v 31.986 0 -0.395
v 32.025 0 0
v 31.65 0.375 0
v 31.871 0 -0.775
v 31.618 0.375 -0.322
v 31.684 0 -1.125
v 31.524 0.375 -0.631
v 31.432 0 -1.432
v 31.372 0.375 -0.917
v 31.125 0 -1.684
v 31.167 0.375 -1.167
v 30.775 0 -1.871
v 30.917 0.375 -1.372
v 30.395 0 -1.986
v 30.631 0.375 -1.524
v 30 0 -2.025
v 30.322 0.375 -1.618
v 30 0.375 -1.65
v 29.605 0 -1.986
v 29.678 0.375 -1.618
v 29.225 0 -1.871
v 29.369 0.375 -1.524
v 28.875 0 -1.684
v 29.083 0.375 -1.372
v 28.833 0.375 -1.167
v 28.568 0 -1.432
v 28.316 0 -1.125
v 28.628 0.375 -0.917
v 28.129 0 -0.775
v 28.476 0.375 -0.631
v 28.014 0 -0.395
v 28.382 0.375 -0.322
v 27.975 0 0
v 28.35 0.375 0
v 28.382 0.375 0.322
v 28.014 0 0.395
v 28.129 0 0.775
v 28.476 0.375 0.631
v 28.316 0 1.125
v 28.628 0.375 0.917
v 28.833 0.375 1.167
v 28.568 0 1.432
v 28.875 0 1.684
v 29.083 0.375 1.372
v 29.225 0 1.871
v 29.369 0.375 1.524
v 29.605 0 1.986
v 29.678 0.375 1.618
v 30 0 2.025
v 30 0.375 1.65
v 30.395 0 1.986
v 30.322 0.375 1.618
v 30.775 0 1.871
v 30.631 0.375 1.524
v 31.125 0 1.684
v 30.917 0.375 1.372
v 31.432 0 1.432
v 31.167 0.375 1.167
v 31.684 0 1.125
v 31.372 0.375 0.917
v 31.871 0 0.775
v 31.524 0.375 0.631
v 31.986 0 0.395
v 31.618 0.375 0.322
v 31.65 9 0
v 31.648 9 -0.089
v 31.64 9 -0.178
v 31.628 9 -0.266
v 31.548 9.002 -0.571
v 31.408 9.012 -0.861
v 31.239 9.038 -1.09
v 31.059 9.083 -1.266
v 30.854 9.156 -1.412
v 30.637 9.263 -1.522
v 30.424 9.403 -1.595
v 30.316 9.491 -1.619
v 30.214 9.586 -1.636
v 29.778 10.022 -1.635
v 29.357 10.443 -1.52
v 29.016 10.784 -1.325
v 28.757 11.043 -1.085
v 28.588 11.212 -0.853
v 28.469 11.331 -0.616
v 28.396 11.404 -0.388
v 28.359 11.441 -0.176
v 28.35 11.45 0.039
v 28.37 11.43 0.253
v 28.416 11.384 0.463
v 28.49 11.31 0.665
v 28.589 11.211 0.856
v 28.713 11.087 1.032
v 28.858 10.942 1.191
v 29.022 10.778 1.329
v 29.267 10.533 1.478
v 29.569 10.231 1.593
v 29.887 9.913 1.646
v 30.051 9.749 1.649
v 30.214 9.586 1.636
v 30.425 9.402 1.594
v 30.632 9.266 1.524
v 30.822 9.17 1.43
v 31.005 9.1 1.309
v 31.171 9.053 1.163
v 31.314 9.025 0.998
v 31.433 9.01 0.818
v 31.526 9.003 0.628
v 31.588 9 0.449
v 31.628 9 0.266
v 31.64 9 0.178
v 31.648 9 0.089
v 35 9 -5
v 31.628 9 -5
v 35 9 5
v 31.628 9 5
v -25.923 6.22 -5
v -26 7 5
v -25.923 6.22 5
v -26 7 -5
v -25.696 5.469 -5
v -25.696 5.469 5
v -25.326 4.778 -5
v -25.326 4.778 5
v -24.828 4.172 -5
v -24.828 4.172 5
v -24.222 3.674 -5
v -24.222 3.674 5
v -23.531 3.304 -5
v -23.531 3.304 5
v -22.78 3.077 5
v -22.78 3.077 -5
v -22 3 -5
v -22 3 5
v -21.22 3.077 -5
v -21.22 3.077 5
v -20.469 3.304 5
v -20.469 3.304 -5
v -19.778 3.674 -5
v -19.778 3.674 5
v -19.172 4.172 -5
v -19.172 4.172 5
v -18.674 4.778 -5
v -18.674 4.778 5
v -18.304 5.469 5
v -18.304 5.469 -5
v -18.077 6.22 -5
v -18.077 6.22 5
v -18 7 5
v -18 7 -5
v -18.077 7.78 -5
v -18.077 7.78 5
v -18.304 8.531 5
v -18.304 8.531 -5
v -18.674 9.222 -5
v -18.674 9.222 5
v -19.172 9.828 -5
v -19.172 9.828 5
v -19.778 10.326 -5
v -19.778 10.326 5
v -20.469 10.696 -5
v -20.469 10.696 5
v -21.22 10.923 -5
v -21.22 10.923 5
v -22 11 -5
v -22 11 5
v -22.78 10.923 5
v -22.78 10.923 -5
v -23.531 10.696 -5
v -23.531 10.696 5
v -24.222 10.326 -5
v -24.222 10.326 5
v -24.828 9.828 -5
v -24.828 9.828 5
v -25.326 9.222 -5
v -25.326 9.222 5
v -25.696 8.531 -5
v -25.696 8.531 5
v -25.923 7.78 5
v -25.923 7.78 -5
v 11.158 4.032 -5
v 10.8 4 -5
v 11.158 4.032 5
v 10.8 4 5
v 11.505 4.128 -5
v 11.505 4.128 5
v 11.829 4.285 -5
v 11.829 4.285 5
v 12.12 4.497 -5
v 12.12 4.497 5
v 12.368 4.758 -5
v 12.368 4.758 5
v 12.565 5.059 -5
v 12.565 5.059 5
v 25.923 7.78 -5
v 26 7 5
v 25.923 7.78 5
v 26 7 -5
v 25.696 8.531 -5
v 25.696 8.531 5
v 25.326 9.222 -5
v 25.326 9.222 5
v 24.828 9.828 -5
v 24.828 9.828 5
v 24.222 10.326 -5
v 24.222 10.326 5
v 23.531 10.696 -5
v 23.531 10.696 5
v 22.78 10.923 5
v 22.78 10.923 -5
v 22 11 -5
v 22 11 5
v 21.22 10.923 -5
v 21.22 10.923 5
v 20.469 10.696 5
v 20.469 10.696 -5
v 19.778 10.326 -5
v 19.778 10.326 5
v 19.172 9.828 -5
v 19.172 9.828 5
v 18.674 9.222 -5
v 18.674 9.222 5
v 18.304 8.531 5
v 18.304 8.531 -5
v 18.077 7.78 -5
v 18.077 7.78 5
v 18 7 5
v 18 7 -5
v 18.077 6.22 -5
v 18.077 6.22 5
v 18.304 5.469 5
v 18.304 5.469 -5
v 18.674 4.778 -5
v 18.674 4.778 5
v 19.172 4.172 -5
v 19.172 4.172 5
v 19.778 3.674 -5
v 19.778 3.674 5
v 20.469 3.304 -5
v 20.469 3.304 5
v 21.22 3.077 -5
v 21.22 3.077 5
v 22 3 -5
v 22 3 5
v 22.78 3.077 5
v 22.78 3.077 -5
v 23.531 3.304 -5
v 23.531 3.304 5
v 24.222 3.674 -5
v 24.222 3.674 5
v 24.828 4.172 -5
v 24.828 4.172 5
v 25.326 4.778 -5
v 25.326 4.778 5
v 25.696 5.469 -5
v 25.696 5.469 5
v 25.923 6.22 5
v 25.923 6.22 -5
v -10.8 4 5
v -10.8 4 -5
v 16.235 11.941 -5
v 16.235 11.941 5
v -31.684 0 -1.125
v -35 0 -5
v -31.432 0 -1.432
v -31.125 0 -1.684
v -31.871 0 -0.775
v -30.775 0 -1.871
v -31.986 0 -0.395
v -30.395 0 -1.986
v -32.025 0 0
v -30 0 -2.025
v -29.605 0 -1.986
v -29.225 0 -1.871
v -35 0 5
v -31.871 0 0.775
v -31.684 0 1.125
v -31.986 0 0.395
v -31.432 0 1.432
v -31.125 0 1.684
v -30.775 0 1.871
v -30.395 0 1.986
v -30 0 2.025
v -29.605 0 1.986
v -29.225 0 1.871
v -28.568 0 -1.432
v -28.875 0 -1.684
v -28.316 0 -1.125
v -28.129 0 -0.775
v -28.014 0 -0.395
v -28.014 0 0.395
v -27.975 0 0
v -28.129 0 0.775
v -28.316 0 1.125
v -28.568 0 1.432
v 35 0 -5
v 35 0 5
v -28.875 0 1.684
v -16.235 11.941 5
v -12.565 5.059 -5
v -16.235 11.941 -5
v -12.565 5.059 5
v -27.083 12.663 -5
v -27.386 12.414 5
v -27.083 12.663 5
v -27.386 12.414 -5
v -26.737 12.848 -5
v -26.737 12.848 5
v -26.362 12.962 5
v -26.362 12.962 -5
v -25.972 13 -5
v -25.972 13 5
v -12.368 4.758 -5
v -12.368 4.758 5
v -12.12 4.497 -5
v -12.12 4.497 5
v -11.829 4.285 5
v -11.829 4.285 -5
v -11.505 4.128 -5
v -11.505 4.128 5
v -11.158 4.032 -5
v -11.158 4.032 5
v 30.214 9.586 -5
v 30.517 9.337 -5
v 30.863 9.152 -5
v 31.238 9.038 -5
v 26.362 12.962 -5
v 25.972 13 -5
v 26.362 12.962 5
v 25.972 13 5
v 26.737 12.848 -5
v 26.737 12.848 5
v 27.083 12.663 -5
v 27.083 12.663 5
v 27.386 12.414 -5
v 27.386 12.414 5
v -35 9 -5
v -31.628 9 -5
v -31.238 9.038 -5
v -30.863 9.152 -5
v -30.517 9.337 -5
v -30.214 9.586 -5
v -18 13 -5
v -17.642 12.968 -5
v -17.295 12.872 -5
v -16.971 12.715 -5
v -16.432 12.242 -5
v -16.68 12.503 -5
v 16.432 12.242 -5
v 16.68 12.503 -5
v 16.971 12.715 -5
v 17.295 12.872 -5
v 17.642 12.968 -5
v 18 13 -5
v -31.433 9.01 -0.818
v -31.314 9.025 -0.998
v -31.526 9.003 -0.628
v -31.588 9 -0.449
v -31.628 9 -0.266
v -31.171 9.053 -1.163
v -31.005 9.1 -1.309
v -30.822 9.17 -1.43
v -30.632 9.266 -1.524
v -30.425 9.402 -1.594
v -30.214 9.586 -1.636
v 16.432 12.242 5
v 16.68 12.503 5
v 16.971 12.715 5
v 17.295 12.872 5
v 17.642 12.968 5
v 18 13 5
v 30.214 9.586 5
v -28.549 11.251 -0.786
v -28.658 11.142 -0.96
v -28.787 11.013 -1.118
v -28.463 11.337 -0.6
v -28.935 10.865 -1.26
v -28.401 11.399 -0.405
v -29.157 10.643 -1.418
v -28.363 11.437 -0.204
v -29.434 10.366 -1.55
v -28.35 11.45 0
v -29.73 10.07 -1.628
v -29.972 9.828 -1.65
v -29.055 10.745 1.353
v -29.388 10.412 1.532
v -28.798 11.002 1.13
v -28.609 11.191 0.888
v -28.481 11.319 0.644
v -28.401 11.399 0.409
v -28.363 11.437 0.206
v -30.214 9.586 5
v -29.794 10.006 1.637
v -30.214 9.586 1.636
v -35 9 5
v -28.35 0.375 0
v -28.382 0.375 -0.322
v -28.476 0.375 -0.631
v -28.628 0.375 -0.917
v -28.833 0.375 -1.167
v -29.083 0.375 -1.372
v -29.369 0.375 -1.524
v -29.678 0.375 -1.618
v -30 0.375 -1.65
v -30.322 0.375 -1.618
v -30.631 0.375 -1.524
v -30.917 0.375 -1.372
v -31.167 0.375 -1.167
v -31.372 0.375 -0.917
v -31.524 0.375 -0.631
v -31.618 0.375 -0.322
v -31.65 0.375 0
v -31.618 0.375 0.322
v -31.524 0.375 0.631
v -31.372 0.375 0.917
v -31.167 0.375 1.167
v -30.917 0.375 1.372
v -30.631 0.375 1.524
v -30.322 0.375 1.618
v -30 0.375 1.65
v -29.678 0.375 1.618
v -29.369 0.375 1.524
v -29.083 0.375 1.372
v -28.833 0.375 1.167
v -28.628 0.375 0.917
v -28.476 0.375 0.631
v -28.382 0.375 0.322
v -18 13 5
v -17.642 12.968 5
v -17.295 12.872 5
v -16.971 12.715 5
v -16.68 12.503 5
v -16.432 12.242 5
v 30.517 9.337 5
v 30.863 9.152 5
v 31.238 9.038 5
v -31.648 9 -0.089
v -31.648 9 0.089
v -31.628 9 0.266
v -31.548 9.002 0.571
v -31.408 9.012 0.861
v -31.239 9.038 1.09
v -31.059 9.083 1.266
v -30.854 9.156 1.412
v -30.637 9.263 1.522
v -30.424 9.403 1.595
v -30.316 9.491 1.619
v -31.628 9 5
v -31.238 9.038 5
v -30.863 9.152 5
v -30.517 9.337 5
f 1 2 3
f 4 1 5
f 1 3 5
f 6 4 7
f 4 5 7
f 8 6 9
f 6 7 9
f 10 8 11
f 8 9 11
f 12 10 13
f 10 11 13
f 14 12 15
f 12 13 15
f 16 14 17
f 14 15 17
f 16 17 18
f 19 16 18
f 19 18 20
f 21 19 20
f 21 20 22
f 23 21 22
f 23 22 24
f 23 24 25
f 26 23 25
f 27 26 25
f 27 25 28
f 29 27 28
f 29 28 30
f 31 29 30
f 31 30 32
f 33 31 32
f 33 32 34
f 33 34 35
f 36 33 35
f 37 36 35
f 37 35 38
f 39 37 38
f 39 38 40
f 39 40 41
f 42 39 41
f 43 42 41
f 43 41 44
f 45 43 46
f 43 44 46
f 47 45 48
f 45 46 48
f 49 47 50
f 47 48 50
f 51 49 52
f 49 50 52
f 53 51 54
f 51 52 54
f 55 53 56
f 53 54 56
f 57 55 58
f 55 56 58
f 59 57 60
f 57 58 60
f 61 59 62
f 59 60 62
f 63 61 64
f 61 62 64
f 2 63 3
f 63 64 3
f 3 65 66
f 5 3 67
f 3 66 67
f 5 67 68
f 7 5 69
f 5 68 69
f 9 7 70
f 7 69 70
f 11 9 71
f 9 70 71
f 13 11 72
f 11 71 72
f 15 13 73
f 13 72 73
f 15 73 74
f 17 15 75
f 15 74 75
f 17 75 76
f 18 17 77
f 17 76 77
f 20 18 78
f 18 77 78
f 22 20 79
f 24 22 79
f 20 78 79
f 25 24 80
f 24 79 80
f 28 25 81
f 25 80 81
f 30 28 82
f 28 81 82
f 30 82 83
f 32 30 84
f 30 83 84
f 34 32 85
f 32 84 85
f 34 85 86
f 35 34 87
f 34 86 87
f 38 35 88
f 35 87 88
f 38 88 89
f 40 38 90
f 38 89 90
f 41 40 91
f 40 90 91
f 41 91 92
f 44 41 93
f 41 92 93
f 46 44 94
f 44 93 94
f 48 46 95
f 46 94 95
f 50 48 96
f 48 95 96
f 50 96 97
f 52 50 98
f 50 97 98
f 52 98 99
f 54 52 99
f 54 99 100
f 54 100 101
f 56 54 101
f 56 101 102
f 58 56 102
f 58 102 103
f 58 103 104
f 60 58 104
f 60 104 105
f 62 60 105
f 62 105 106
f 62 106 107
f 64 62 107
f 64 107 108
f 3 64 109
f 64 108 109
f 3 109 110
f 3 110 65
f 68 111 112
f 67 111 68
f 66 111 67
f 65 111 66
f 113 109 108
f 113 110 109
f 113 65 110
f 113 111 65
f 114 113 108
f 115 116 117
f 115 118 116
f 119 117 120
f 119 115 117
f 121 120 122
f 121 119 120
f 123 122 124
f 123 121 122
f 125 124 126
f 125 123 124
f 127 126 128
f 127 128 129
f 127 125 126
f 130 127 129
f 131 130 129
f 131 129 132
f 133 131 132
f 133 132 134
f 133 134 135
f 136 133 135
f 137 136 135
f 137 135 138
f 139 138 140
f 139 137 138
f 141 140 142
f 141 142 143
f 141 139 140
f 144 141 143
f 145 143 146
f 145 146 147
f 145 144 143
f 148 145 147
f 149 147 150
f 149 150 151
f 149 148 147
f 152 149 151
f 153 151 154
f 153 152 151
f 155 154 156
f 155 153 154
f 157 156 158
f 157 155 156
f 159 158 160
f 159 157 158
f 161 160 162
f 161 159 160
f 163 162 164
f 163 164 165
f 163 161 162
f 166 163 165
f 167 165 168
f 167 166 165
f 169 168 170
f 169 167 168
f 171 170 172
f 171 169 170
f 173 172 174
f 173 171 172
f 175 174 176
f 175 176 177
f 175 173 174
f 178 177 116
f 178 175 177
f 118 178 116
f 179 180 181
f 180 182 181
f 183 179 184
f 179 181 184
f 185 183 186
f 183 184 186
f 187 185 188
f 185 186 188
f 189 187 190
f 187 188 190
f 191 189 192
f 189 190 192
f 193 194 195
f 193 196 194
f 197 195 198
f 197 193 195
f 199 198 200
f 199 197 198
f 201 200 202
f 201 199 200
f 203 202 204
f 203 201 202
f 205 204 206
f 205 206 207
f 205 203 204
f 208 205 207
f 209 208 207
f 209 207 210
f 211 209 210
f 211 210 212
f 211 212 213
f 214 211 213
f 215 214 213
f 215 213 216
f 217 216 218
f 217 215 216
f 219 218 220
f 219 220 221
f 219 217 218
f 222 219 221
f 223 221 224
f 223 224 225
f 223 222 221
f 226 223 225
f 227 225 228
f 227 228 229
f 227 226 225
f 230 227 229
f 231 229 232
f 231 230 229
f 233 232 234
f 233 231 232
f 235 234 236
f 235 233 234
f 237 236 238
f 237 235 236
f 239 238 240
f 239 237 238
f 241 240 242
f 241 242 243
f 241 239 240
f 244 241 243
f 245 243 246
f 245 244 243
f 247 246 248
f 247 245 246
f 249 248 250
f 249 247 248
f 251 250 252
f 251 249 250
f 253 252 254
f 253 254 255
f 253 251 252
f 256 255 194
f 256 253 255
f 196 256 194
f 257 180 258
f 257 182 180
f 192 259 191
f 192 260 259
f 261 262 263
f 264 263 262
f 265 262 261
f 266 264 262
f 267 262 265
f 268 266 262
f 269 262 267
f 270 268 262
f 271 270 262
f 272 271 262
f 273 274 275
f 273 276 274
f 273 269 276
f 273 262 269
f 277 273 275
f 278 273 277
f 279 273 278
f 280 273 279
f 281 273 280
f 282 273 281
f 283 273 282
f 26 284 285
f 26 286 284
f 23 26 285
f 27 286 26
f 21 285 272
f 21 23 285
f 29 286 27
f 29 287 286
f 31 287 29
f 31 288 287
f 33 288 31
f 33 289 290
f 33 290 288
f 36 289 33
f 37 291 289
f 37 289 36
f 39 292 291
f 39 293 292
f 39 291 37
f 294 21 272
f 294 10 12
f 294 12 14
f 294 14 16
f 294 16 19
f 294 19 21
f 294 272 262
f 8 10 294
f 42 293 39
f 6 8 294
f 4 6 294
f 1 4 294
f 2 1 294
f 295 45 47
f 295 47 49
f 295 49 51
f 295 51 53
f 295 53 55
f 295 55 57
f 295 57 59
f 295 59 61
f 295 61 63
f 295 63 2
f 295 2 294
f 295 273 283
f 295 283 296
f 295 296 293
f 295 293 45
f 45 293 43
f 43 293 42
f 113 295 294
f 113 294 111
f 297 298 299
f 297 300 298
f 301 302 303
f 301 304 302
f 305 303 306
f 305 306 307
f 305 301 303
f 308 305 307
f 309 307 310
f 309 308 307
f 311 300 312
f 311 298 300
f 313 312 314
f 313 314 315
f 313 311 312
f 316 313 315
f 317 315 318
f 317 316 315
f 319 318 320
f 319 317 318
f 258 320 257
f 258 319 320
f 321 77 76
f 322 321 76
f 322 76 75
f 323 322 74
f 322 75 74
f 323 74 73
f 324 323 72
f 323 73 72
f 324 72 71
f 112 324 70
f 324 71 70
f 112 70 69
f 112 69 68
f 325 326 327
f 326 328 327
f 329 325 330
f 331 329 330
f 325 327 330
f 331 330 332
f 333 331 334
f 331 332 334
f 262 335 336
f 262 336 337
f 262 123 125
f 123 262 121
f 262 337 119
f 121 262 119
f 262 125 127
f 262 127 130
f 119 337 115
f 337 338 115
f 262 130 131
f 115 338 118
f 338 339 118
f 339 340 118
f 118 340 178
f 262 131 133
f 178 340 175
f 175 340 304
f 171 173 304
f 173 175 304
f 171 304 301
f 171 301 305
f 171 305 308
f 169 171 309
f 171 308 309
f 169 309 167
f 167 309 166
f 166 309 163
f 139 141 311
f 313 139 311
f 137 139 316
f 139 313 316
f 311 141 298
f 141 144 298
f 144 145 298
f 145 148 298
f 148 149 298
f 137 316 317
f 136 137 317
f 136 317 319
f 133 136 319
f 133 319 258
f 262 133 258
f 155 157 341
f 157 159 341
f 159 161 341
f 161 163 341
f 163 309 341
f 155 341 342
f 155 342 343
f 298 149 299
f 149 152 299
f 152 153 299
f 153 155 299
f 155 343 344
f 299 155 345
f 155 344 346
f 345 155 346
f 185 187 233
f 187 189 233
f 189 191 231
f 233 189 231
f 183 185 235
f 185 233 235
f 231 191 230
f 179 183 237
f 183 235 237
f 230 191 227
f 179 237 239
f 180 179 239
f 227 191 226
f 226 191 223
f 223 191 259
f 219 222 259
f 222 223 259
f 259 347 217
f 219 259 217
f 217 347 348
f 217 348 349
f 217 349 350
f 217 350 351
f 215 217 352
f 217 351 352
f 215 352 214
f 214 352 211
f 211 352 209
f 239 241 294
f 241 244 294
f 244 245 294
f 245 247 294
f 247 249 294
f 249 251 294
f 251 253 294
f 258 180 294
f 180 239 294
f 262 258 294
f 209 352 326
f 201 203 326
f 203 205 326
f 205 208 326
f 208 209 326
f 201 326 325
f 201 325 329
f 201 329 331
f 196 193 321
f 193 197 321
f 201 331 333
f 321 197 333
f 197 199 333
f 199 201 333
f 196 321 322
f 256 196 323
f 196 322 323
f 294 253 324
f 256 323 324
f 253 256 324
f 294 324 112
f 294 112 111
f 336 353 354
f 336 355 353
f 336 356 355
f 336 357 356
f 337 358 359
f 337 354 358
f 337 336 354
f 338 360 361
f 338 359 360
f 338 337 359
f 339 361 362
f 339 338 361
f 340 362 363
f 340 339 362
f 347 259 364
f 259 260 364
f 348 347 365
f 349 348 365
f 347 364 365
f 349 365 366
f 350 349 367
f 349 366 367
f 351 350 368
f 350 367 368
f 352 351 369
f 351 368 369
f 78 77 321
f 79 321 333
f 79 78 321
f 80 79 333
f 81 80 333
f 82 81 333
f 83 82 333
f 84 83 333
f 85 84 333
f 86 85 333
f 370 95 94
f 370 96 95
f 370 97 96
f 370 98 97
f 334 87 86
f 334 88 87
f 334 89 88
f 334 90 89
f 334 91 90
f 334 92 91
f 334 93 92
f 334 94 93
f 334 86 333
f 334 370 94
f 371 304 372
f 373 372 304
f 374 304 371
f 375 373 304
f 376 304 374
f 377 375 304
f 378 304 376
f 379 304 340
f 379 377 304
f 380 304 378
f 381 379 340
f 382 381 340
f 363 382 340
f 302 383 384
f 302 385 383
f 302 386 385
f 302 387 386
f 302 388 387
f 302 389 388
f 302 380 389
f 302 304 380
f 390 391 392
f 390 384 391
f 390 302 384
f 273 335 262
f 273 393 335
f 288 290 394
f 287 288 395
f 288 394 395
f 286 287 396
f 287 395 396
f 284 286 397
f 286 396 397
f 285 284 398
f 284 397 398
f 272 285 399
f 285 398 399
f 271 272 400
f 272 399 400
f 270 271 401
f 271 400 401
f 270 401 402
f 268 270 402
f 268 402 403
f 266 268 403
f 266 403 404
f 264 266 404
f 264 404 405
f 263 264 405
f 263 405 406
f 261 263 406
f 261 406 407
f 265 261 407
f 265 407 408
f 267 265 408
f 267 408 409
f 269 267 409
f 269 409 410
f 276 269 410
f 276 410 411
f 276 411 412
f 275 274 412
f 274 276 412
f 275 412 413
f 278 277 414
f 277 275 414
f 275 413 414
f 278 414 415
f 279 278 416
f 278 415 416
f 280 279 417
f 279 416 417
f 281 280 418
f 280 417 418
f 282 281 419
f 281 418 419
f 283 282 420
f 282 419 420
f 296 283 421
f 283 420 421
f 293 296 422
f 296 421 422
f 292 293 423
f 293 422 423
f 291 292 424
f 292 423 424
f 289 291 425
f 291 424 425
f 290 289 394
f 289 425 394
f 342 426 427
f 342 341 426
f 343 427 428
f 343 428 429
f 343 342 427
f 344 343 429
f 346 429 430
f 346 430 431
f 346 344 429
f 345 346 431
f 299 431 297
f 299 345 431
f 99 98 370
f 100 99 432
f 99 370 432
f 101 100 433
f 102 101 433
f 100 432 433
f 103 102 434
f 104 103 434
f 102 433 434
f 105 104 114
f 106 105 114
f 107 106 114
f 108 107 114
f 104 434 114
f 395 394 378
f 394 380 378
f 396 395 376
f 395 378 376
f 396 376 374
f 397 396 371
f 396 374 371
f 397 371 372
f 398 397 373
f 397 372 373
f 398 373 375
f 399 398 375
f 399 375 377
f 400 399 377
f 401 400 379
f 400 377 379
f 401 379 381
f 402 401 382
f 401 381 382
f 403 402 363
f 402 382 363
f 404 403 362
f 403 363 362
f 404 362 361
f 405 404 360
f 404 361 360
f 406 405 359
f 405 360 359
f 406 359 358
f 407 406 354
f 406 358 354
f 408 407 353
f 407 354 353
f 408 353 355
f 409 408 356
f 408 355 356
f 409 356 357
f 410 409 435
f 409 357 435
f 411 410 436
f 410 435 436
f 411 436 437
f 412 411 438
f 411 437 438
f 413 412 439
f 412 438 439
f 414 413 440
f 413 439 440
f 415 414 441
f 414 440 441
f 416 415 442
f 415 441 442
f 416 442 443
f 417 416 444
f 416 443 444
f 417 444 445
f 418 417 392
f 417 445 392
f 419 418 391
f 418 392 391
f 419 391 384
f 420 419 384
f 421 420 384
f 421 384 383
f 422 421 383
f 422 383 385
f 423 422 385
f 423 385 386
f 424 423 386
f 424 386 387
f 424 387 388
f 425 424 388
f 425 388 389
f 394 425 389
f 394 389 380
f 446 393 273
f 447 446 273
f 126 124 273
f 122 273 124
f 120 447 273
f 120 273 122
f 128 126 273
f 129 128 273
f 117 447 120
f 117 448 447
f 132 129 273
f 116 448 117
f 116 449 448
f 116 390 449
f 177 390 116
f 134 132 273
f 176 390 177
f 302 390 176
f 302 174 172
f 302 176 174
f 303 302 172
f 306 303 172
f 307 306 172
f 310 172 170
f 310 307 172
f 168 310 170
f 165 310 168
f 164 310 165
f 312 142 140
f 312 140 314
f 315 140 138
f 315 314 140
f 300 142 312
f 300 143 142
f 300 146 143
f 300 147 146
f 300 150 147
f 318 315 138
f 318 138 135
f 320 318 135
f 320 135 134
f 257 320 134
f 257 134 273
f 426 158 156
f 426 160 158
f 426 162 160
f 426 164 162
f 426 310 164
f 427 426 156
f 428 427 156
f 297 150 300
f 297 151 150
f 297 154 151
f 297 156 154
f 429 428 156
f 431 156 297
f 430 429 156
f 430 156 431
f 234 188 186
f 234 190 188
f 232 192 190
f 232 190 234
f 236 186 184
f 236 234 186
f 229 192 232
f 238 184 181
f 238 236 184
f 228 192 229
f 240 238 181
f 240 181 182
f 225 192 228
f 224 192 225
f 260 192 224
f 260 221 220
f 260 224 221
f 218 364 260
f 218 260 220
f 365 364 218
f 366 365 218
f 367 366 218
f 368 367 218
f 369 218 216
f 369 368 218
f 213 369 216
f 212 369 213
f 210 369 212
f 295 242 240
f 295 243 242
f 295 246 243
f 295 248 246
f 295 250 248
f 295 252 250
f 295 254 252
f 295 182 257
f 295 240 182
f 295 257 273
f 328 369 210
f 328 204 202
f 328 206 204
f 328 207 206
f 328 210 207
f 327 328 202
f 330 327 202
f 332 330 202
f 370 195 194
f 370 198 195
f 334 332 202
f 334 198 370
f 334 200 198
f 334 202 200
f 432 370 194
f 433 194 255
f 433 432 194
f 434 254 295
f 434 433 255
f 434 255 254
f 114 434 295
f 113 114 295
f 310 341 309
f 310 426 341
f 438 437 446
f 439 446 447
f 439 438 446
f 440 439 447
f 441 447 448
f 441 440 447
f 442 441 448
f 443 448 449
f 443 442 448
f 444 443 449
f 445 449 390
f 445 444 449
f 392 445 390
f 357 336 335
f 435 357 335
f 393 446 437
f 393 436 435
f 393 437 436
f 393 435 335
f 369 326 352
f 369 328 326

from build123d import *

# Parameters (mm, degrees)
SKETCH1_R                   = 4
BOSS_EXTRUDE1_DEPTH         = 5
FILLET1_R                   = 2
M4_TAPPED_HOLE1_D           = 3.3
M4_TAPPED_HOLE1_CSINK_D     = 4.05
M4_TAPPED_HOLE1_CSINK_ANGLE = 90


with BuildPart() as part:
    # Sketch1 → Boss-Extrude1 (new, symmetric)
    with BuildSketch(Plane.XY):
        Polygon((-35, 0), (35, 0), (35, 9), (30.8, 9), (26.8, 13), (16.8, 13), (12, 4), (-12, 4), (-16.8, 13), (-26.8, 13), (-30.8, 9), (-35, 9), align=None)
        with Locations((22, 7)):
            Circle(SKETCH1_R, mode=Mode.SUBTRACT)
        with Locations(Location((-22, 7, 0), (0, 0, 180))):
            Circle(SKETCH1_R, mode=Mode.SUBTRACT)
    extrude(amount=BOSS_EXTRUDE1_DEPTH, both=True)

    # Fillet1
    fillet1_edges = [part.edges().sort_by_distance(p)[0] for p in [
        (-30.8, 9, 0),
        (-26.8, 13, 0),
        (-16.8, 13, 0),
        (-12, 4, 0),
        (12, 4, 0),
        (16.8, 13, 0),
        (26.8, 13, 0),
        (30.8, 9, 0),
    ]]
    fillet(fillet1_edges, radius=FILLET1_R)

    # M4 Tapped Hole1 (through all)
    with Locations(Plane(origin=(0, 0, 0), x_dir=(-1, 0, 0), z_dir=(0, -1, 0))):
        with Locations((-30, 0), (30, 0)):
            CounterSinkHole(M4_TAPPED_HOLE1_D / 2, M4_TAPPED_HOLE1_CSINK_D / 2, counter_sink_angle=M4_TAPPED_HOLE1_CSINK_ANGLE)


solid = part.part
